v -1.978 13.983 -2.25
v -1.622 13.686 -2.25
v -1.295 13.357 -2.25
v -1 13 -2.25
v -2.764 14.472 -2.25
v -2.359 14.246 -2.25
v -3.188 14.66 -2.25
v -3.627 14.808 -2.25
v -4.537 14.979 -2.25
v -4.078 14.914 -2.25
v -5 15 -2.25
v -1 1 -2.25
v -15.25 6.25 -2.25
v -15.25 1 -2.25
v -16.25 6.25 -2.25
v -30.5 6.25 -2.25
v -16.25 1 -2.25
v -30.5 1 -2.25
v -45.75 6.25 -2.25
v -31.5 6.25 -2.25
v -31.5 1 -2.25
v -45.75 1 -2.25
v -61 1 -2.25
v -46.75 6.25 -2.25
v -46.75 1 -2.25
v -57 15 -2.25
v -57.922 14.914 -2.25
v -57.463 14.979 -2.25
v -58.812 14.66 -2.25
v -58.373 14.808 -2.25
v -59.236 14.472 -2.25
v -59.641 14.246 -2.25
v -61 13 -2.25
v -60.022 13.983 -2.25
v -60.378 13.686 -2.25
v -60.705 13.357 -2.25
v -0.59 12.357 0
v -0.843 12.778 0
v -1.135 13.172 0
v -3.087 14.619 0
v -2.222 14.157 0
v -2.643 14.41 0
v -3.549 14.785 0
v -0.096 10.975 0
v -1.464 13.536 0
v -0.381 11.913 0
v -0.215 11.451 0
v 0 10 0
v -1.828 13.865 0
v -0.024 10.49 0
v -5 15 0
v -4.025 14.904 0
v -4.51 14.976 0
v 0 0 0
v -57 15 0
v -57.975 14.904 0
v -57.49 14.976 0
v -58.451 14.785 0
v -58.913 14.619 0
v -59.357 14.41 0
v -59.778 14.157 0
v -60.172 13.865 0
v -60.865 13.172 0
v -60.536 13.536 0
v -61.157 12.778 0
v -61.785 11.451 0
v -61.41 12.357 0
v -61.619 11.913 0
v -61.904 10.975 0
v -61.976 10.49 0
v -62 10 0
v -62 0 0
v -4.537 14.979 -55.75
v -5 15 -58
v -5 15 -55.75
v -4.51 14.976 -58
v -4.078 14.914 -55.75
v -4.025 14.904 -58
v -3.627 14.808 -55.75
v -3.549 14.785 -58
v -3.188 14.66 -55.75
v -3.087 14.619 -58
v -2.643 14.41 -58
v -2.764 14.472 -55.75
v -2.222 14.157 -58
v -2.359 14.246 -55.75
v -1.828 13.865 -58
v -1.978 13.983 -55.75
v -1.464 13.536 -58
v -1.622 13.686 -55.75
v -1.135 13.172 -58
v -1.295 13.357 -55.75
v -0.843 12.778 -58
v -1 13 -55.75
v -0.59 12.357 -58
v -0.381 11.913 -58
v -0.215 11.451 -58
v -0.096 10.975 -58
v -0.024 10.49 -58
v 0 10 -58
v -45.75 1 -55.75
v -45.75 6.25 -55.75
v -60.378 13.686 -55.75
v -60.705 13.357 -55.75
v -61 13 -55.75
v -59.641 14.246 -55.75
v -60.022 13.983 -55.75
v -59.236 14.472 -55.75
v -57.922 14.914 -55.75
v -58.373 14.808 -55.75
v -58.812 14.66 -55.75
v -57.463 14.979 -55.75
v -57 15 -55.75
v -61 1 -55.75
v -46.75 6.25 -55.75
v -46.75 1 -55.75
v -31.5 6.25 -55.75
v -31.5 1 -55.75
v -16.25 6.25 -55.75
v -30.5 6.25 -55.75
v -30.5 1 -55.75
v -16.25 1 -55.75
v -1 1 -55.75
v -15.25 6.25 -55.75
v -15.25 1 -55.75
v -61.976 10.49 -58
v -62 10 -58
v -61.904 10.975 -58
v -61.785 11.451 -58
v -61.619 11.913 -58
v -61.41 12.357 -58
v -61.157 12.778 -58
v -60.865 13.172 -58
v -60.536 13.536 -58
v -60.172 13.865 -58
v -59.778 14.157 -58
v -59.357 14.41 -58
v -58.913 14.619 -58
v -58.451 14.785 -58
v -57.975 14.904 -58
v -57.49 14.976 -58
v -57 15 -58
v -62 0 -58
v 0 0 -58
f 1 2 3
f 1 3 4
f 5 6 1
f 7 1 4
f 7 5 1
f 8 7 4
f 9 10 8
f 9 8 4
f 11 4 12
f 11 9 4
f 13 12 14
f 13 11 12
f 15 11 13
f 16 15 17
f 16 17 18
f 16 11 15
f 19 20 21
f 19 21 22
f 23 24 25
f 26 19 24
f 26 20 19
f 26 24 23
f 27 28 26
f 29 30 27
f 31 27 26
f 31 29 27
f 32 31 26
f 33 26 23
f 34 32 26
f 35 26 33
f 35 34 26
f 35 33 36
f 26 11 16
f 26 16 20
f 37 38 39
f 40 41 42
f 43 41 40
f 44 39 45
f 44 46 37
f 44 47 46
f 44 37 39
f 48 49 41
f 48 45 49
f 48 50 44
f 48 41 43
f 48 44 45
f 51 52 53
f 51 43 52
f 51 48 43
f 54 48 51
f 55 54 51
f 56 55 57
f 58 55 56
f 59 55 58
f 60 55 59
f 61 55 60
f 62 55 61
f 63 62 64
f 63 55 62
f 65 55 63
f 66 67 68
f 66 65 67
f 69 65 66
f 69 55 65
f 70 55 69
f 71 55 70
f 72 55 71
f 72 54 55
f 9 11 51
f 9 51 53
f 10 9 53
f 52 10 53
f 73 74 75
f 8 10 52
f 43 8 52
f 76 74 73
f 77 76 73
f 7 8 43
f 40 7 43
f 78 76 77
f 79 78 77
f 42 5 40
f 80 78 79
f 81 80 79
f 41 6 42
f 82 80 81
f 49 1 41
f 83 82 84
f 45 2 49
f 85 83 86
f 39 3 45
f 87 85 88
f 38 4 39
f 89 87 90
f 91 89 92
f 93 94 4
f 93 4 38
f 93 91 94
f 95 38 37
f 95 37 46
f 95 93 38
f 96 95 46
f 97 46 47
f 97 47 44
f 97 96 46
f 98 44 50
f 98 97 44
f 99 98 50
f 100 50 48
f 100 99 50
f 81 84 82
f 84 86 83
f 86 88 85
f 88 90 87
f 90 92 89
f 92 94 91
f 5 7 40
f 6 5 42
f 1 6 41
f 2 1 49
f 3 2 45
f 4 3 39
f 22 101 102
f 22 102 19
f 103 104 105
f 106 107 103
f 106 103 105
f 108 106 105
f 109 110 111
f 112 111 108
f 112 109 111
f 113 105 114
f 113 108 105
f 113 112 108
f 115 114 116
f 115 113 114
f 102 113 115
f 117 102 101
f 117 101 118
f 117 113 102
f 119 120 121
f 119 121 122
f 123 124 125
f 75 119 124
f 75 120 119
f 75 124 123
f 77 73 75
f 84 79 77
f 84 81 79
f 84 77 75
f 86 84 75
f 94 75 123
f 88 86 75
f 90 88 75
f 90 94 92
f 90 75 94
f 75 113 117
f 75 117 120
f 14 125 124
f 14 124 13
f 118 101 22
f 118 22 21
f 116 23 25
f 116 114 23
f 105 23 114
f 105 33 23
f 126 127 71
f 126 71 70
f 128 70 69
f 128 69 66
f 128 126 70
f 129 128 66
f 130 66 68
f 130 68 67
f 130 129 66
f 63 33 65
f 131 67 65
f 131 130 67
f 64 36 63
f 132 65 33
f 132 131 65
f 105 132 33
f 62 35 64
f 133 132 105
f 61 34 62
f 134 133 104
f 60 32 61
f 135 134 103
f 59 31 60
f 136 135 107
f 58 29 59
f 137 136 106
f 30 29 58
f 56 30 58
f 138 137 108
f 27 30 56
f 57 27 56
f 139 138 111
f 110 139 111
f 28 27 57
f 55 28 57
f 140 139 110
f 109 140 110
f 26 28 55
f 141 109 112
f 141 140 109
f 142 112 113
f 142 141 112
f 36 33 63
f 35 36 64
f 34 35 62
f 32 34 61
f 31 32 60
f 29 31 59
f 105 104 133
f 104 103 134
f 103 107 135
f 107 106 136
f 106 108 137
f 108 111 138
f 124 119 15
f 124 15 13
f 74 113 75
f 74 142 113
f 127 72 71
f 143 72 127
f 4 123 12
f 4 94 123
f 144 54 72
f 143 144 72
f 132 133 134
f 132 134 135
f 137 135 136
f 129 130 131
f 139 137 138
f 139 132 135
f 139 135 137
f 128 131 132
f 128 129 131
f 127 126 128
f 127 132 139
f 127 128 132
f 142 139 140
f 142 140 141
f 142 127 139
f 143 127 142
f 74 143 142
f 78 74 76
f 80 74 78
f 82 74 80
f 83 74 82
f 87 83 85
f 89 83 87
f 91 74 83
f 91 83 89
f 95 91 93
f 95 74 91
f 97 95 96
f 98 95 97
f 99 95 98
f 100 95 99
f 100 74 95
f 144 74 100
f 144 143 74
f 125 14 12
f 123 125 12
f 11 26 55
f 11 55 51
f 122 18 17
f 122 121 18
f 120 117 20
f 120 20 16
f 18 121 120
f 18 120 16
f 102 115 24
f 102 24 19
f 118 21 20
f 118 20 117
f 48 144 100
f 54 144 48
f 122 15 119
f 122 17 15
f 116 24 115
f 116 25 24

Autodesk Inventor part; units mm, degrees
ref_plane "YZ Plane" through (0, 0, 0) normal (1, 0, 0) x (0, 1, 0)
ref_plane "XZ Plane" through (0, 0, 0) normal (0, 1, 0) x (-1, 0, 0)
ref_plane "XY Plane" through (0, 0, 0) normal (0, 0, 1) x (1, 0, 0)
sketch "Sketch1" plane through (0, 0, 0) normal (0, 1, 0) x (-1, 0, 0)
  line L0 (0, 0) -> (62, 0)
  line L1 (62, 0) -> (62, -58)
  line L2 (62, -58) -> (0, -58)
  line L3 (0, -58) -> (0, 0)
  dimension "d0" = 62
  dimension "d1" = 58
extrude "Extrusion1" add sketch "Sketch1" along normal blind 15
sketch "Sketch2" plane through (0, 0, -58) normal (0, 0, -1) x (-1, 0, 0)
  line L0 (62, 0) -> (0, 0) projected
  line L1 (0, 0) -> (62, 0)
  line L2 (62, 0) -> (62, 10)
  line L3 (57, 15) -> (5, 15)
  line L4 (0, 10) -> (0, 0)
  arc A0 (5, 15) -> (0, 10) centre (5, 10) ccw
  arc A1 (62, 10) -> (57, 15) centre (57, 10) ccw
  line L5 (0, 10) -> (-2.4331, 10)
  line L6 (-2.4331, 10) -> (-2.4331, 19.594)
  line L7 (-2.4331, 19.594) -> (72.365, 19.594)
  line L8 (72.365, 19.594) -> (72.365, 10)
  line L9 (72.365, 10) -> (62, 10)
  point P0 (62, 15)
  dimension "d4" = 5
extrude "Extrusion2" cut sketch "Sketch2" against normal up to surface (58 mm away) contours A1 L3 A0 L5 L6 L7 L8 L9
sketch "Sketch3" plane through (0, 15, 0) normal (0, 1, 0) x (1, 0, 0)
  line L0 (-1, 2.25) -> (-61, 2.25)
  line L1 (-61, 2.25) -> (-61, 55.75)
  line L2 (-61, 55.75) -> (-1, 55.75)
  line L3 (-1, 55.75) -> (-1, 2.25)
  line L4 (-57, 0) -> (-5, 0) projected
  line L5 (-5, 58) -> (-57, 58) projected
  line L6 (-62, 0) -> (-62, 58) projected
  line L7 (0, 58) -> (0, 0) projected
  dimension "d7" = 2.25
  dimension "d8" = 2.25
  dimension "d9" = 1
  dimension "d10" = 1
extrude "Extrusion3" cut sketch "Sketch3" against normal blind 14
sketch "Sketch4" plane through (0, 1, 0) normal (0, 1, 0) x (1, 0, 0)
  line L0 (-5, 2.25) -> (-57, 2.25) projected
  line L1 (-57, 55.75) -> (-5, 55.75) projected
  line L2 (-15.25, 2.25) -> (-16.25, 2.25)
  line L3 (-16.25, 2.25) -> (-16.25, 55.75)
  line L4 (-16.25, 55.75) -> (-15.25, 55.75)
  line L5 (-15.25, 55.75) -> (-15.25, 2.25)
  line L6 (-30.5, 2.25) -> (-31.5, 2.25)
  line L7 (-31.5, 2.25) -> (-31.5, 55.75)
  line L8 (-31.5, 55.75) -> (-30.5, 55.75)
  line L9 (-30.5, 55.75) -> (-30.5, 2.25)
  line L10 (-45.75, 2.25) -> (-46.75, 2.25)
  line L11 (-46.75, 2.25) -> (-46.75, 55.75)
  line L12 (-46.75, 55.75) -> (-45.75, 55.75)
  line L13 (-45.75, 55.75) -> (-45.75, 2.25)
  line L14 (-61, 2.25) -> (-61, 55.75) projected
  line L15 (-1, 55.75) -> (-1, 2.25) projected
  point P0 (0, 0)
  dimension "d13" = 1
  dimension "d14" = 1
  dimension "d15" = 1
  dimension "d16" = 14.25
  dimension "d17" = 14.25
  dimension "d18" = 14.25
extrude "Extrusion4" add sketch "Sketch4" along normal blind 5.25 contours L0 L3 L1 L5 | L0 L7 L1 L9 | L0 L11 L1 L13
properties part number "RoughBatteryPack"
